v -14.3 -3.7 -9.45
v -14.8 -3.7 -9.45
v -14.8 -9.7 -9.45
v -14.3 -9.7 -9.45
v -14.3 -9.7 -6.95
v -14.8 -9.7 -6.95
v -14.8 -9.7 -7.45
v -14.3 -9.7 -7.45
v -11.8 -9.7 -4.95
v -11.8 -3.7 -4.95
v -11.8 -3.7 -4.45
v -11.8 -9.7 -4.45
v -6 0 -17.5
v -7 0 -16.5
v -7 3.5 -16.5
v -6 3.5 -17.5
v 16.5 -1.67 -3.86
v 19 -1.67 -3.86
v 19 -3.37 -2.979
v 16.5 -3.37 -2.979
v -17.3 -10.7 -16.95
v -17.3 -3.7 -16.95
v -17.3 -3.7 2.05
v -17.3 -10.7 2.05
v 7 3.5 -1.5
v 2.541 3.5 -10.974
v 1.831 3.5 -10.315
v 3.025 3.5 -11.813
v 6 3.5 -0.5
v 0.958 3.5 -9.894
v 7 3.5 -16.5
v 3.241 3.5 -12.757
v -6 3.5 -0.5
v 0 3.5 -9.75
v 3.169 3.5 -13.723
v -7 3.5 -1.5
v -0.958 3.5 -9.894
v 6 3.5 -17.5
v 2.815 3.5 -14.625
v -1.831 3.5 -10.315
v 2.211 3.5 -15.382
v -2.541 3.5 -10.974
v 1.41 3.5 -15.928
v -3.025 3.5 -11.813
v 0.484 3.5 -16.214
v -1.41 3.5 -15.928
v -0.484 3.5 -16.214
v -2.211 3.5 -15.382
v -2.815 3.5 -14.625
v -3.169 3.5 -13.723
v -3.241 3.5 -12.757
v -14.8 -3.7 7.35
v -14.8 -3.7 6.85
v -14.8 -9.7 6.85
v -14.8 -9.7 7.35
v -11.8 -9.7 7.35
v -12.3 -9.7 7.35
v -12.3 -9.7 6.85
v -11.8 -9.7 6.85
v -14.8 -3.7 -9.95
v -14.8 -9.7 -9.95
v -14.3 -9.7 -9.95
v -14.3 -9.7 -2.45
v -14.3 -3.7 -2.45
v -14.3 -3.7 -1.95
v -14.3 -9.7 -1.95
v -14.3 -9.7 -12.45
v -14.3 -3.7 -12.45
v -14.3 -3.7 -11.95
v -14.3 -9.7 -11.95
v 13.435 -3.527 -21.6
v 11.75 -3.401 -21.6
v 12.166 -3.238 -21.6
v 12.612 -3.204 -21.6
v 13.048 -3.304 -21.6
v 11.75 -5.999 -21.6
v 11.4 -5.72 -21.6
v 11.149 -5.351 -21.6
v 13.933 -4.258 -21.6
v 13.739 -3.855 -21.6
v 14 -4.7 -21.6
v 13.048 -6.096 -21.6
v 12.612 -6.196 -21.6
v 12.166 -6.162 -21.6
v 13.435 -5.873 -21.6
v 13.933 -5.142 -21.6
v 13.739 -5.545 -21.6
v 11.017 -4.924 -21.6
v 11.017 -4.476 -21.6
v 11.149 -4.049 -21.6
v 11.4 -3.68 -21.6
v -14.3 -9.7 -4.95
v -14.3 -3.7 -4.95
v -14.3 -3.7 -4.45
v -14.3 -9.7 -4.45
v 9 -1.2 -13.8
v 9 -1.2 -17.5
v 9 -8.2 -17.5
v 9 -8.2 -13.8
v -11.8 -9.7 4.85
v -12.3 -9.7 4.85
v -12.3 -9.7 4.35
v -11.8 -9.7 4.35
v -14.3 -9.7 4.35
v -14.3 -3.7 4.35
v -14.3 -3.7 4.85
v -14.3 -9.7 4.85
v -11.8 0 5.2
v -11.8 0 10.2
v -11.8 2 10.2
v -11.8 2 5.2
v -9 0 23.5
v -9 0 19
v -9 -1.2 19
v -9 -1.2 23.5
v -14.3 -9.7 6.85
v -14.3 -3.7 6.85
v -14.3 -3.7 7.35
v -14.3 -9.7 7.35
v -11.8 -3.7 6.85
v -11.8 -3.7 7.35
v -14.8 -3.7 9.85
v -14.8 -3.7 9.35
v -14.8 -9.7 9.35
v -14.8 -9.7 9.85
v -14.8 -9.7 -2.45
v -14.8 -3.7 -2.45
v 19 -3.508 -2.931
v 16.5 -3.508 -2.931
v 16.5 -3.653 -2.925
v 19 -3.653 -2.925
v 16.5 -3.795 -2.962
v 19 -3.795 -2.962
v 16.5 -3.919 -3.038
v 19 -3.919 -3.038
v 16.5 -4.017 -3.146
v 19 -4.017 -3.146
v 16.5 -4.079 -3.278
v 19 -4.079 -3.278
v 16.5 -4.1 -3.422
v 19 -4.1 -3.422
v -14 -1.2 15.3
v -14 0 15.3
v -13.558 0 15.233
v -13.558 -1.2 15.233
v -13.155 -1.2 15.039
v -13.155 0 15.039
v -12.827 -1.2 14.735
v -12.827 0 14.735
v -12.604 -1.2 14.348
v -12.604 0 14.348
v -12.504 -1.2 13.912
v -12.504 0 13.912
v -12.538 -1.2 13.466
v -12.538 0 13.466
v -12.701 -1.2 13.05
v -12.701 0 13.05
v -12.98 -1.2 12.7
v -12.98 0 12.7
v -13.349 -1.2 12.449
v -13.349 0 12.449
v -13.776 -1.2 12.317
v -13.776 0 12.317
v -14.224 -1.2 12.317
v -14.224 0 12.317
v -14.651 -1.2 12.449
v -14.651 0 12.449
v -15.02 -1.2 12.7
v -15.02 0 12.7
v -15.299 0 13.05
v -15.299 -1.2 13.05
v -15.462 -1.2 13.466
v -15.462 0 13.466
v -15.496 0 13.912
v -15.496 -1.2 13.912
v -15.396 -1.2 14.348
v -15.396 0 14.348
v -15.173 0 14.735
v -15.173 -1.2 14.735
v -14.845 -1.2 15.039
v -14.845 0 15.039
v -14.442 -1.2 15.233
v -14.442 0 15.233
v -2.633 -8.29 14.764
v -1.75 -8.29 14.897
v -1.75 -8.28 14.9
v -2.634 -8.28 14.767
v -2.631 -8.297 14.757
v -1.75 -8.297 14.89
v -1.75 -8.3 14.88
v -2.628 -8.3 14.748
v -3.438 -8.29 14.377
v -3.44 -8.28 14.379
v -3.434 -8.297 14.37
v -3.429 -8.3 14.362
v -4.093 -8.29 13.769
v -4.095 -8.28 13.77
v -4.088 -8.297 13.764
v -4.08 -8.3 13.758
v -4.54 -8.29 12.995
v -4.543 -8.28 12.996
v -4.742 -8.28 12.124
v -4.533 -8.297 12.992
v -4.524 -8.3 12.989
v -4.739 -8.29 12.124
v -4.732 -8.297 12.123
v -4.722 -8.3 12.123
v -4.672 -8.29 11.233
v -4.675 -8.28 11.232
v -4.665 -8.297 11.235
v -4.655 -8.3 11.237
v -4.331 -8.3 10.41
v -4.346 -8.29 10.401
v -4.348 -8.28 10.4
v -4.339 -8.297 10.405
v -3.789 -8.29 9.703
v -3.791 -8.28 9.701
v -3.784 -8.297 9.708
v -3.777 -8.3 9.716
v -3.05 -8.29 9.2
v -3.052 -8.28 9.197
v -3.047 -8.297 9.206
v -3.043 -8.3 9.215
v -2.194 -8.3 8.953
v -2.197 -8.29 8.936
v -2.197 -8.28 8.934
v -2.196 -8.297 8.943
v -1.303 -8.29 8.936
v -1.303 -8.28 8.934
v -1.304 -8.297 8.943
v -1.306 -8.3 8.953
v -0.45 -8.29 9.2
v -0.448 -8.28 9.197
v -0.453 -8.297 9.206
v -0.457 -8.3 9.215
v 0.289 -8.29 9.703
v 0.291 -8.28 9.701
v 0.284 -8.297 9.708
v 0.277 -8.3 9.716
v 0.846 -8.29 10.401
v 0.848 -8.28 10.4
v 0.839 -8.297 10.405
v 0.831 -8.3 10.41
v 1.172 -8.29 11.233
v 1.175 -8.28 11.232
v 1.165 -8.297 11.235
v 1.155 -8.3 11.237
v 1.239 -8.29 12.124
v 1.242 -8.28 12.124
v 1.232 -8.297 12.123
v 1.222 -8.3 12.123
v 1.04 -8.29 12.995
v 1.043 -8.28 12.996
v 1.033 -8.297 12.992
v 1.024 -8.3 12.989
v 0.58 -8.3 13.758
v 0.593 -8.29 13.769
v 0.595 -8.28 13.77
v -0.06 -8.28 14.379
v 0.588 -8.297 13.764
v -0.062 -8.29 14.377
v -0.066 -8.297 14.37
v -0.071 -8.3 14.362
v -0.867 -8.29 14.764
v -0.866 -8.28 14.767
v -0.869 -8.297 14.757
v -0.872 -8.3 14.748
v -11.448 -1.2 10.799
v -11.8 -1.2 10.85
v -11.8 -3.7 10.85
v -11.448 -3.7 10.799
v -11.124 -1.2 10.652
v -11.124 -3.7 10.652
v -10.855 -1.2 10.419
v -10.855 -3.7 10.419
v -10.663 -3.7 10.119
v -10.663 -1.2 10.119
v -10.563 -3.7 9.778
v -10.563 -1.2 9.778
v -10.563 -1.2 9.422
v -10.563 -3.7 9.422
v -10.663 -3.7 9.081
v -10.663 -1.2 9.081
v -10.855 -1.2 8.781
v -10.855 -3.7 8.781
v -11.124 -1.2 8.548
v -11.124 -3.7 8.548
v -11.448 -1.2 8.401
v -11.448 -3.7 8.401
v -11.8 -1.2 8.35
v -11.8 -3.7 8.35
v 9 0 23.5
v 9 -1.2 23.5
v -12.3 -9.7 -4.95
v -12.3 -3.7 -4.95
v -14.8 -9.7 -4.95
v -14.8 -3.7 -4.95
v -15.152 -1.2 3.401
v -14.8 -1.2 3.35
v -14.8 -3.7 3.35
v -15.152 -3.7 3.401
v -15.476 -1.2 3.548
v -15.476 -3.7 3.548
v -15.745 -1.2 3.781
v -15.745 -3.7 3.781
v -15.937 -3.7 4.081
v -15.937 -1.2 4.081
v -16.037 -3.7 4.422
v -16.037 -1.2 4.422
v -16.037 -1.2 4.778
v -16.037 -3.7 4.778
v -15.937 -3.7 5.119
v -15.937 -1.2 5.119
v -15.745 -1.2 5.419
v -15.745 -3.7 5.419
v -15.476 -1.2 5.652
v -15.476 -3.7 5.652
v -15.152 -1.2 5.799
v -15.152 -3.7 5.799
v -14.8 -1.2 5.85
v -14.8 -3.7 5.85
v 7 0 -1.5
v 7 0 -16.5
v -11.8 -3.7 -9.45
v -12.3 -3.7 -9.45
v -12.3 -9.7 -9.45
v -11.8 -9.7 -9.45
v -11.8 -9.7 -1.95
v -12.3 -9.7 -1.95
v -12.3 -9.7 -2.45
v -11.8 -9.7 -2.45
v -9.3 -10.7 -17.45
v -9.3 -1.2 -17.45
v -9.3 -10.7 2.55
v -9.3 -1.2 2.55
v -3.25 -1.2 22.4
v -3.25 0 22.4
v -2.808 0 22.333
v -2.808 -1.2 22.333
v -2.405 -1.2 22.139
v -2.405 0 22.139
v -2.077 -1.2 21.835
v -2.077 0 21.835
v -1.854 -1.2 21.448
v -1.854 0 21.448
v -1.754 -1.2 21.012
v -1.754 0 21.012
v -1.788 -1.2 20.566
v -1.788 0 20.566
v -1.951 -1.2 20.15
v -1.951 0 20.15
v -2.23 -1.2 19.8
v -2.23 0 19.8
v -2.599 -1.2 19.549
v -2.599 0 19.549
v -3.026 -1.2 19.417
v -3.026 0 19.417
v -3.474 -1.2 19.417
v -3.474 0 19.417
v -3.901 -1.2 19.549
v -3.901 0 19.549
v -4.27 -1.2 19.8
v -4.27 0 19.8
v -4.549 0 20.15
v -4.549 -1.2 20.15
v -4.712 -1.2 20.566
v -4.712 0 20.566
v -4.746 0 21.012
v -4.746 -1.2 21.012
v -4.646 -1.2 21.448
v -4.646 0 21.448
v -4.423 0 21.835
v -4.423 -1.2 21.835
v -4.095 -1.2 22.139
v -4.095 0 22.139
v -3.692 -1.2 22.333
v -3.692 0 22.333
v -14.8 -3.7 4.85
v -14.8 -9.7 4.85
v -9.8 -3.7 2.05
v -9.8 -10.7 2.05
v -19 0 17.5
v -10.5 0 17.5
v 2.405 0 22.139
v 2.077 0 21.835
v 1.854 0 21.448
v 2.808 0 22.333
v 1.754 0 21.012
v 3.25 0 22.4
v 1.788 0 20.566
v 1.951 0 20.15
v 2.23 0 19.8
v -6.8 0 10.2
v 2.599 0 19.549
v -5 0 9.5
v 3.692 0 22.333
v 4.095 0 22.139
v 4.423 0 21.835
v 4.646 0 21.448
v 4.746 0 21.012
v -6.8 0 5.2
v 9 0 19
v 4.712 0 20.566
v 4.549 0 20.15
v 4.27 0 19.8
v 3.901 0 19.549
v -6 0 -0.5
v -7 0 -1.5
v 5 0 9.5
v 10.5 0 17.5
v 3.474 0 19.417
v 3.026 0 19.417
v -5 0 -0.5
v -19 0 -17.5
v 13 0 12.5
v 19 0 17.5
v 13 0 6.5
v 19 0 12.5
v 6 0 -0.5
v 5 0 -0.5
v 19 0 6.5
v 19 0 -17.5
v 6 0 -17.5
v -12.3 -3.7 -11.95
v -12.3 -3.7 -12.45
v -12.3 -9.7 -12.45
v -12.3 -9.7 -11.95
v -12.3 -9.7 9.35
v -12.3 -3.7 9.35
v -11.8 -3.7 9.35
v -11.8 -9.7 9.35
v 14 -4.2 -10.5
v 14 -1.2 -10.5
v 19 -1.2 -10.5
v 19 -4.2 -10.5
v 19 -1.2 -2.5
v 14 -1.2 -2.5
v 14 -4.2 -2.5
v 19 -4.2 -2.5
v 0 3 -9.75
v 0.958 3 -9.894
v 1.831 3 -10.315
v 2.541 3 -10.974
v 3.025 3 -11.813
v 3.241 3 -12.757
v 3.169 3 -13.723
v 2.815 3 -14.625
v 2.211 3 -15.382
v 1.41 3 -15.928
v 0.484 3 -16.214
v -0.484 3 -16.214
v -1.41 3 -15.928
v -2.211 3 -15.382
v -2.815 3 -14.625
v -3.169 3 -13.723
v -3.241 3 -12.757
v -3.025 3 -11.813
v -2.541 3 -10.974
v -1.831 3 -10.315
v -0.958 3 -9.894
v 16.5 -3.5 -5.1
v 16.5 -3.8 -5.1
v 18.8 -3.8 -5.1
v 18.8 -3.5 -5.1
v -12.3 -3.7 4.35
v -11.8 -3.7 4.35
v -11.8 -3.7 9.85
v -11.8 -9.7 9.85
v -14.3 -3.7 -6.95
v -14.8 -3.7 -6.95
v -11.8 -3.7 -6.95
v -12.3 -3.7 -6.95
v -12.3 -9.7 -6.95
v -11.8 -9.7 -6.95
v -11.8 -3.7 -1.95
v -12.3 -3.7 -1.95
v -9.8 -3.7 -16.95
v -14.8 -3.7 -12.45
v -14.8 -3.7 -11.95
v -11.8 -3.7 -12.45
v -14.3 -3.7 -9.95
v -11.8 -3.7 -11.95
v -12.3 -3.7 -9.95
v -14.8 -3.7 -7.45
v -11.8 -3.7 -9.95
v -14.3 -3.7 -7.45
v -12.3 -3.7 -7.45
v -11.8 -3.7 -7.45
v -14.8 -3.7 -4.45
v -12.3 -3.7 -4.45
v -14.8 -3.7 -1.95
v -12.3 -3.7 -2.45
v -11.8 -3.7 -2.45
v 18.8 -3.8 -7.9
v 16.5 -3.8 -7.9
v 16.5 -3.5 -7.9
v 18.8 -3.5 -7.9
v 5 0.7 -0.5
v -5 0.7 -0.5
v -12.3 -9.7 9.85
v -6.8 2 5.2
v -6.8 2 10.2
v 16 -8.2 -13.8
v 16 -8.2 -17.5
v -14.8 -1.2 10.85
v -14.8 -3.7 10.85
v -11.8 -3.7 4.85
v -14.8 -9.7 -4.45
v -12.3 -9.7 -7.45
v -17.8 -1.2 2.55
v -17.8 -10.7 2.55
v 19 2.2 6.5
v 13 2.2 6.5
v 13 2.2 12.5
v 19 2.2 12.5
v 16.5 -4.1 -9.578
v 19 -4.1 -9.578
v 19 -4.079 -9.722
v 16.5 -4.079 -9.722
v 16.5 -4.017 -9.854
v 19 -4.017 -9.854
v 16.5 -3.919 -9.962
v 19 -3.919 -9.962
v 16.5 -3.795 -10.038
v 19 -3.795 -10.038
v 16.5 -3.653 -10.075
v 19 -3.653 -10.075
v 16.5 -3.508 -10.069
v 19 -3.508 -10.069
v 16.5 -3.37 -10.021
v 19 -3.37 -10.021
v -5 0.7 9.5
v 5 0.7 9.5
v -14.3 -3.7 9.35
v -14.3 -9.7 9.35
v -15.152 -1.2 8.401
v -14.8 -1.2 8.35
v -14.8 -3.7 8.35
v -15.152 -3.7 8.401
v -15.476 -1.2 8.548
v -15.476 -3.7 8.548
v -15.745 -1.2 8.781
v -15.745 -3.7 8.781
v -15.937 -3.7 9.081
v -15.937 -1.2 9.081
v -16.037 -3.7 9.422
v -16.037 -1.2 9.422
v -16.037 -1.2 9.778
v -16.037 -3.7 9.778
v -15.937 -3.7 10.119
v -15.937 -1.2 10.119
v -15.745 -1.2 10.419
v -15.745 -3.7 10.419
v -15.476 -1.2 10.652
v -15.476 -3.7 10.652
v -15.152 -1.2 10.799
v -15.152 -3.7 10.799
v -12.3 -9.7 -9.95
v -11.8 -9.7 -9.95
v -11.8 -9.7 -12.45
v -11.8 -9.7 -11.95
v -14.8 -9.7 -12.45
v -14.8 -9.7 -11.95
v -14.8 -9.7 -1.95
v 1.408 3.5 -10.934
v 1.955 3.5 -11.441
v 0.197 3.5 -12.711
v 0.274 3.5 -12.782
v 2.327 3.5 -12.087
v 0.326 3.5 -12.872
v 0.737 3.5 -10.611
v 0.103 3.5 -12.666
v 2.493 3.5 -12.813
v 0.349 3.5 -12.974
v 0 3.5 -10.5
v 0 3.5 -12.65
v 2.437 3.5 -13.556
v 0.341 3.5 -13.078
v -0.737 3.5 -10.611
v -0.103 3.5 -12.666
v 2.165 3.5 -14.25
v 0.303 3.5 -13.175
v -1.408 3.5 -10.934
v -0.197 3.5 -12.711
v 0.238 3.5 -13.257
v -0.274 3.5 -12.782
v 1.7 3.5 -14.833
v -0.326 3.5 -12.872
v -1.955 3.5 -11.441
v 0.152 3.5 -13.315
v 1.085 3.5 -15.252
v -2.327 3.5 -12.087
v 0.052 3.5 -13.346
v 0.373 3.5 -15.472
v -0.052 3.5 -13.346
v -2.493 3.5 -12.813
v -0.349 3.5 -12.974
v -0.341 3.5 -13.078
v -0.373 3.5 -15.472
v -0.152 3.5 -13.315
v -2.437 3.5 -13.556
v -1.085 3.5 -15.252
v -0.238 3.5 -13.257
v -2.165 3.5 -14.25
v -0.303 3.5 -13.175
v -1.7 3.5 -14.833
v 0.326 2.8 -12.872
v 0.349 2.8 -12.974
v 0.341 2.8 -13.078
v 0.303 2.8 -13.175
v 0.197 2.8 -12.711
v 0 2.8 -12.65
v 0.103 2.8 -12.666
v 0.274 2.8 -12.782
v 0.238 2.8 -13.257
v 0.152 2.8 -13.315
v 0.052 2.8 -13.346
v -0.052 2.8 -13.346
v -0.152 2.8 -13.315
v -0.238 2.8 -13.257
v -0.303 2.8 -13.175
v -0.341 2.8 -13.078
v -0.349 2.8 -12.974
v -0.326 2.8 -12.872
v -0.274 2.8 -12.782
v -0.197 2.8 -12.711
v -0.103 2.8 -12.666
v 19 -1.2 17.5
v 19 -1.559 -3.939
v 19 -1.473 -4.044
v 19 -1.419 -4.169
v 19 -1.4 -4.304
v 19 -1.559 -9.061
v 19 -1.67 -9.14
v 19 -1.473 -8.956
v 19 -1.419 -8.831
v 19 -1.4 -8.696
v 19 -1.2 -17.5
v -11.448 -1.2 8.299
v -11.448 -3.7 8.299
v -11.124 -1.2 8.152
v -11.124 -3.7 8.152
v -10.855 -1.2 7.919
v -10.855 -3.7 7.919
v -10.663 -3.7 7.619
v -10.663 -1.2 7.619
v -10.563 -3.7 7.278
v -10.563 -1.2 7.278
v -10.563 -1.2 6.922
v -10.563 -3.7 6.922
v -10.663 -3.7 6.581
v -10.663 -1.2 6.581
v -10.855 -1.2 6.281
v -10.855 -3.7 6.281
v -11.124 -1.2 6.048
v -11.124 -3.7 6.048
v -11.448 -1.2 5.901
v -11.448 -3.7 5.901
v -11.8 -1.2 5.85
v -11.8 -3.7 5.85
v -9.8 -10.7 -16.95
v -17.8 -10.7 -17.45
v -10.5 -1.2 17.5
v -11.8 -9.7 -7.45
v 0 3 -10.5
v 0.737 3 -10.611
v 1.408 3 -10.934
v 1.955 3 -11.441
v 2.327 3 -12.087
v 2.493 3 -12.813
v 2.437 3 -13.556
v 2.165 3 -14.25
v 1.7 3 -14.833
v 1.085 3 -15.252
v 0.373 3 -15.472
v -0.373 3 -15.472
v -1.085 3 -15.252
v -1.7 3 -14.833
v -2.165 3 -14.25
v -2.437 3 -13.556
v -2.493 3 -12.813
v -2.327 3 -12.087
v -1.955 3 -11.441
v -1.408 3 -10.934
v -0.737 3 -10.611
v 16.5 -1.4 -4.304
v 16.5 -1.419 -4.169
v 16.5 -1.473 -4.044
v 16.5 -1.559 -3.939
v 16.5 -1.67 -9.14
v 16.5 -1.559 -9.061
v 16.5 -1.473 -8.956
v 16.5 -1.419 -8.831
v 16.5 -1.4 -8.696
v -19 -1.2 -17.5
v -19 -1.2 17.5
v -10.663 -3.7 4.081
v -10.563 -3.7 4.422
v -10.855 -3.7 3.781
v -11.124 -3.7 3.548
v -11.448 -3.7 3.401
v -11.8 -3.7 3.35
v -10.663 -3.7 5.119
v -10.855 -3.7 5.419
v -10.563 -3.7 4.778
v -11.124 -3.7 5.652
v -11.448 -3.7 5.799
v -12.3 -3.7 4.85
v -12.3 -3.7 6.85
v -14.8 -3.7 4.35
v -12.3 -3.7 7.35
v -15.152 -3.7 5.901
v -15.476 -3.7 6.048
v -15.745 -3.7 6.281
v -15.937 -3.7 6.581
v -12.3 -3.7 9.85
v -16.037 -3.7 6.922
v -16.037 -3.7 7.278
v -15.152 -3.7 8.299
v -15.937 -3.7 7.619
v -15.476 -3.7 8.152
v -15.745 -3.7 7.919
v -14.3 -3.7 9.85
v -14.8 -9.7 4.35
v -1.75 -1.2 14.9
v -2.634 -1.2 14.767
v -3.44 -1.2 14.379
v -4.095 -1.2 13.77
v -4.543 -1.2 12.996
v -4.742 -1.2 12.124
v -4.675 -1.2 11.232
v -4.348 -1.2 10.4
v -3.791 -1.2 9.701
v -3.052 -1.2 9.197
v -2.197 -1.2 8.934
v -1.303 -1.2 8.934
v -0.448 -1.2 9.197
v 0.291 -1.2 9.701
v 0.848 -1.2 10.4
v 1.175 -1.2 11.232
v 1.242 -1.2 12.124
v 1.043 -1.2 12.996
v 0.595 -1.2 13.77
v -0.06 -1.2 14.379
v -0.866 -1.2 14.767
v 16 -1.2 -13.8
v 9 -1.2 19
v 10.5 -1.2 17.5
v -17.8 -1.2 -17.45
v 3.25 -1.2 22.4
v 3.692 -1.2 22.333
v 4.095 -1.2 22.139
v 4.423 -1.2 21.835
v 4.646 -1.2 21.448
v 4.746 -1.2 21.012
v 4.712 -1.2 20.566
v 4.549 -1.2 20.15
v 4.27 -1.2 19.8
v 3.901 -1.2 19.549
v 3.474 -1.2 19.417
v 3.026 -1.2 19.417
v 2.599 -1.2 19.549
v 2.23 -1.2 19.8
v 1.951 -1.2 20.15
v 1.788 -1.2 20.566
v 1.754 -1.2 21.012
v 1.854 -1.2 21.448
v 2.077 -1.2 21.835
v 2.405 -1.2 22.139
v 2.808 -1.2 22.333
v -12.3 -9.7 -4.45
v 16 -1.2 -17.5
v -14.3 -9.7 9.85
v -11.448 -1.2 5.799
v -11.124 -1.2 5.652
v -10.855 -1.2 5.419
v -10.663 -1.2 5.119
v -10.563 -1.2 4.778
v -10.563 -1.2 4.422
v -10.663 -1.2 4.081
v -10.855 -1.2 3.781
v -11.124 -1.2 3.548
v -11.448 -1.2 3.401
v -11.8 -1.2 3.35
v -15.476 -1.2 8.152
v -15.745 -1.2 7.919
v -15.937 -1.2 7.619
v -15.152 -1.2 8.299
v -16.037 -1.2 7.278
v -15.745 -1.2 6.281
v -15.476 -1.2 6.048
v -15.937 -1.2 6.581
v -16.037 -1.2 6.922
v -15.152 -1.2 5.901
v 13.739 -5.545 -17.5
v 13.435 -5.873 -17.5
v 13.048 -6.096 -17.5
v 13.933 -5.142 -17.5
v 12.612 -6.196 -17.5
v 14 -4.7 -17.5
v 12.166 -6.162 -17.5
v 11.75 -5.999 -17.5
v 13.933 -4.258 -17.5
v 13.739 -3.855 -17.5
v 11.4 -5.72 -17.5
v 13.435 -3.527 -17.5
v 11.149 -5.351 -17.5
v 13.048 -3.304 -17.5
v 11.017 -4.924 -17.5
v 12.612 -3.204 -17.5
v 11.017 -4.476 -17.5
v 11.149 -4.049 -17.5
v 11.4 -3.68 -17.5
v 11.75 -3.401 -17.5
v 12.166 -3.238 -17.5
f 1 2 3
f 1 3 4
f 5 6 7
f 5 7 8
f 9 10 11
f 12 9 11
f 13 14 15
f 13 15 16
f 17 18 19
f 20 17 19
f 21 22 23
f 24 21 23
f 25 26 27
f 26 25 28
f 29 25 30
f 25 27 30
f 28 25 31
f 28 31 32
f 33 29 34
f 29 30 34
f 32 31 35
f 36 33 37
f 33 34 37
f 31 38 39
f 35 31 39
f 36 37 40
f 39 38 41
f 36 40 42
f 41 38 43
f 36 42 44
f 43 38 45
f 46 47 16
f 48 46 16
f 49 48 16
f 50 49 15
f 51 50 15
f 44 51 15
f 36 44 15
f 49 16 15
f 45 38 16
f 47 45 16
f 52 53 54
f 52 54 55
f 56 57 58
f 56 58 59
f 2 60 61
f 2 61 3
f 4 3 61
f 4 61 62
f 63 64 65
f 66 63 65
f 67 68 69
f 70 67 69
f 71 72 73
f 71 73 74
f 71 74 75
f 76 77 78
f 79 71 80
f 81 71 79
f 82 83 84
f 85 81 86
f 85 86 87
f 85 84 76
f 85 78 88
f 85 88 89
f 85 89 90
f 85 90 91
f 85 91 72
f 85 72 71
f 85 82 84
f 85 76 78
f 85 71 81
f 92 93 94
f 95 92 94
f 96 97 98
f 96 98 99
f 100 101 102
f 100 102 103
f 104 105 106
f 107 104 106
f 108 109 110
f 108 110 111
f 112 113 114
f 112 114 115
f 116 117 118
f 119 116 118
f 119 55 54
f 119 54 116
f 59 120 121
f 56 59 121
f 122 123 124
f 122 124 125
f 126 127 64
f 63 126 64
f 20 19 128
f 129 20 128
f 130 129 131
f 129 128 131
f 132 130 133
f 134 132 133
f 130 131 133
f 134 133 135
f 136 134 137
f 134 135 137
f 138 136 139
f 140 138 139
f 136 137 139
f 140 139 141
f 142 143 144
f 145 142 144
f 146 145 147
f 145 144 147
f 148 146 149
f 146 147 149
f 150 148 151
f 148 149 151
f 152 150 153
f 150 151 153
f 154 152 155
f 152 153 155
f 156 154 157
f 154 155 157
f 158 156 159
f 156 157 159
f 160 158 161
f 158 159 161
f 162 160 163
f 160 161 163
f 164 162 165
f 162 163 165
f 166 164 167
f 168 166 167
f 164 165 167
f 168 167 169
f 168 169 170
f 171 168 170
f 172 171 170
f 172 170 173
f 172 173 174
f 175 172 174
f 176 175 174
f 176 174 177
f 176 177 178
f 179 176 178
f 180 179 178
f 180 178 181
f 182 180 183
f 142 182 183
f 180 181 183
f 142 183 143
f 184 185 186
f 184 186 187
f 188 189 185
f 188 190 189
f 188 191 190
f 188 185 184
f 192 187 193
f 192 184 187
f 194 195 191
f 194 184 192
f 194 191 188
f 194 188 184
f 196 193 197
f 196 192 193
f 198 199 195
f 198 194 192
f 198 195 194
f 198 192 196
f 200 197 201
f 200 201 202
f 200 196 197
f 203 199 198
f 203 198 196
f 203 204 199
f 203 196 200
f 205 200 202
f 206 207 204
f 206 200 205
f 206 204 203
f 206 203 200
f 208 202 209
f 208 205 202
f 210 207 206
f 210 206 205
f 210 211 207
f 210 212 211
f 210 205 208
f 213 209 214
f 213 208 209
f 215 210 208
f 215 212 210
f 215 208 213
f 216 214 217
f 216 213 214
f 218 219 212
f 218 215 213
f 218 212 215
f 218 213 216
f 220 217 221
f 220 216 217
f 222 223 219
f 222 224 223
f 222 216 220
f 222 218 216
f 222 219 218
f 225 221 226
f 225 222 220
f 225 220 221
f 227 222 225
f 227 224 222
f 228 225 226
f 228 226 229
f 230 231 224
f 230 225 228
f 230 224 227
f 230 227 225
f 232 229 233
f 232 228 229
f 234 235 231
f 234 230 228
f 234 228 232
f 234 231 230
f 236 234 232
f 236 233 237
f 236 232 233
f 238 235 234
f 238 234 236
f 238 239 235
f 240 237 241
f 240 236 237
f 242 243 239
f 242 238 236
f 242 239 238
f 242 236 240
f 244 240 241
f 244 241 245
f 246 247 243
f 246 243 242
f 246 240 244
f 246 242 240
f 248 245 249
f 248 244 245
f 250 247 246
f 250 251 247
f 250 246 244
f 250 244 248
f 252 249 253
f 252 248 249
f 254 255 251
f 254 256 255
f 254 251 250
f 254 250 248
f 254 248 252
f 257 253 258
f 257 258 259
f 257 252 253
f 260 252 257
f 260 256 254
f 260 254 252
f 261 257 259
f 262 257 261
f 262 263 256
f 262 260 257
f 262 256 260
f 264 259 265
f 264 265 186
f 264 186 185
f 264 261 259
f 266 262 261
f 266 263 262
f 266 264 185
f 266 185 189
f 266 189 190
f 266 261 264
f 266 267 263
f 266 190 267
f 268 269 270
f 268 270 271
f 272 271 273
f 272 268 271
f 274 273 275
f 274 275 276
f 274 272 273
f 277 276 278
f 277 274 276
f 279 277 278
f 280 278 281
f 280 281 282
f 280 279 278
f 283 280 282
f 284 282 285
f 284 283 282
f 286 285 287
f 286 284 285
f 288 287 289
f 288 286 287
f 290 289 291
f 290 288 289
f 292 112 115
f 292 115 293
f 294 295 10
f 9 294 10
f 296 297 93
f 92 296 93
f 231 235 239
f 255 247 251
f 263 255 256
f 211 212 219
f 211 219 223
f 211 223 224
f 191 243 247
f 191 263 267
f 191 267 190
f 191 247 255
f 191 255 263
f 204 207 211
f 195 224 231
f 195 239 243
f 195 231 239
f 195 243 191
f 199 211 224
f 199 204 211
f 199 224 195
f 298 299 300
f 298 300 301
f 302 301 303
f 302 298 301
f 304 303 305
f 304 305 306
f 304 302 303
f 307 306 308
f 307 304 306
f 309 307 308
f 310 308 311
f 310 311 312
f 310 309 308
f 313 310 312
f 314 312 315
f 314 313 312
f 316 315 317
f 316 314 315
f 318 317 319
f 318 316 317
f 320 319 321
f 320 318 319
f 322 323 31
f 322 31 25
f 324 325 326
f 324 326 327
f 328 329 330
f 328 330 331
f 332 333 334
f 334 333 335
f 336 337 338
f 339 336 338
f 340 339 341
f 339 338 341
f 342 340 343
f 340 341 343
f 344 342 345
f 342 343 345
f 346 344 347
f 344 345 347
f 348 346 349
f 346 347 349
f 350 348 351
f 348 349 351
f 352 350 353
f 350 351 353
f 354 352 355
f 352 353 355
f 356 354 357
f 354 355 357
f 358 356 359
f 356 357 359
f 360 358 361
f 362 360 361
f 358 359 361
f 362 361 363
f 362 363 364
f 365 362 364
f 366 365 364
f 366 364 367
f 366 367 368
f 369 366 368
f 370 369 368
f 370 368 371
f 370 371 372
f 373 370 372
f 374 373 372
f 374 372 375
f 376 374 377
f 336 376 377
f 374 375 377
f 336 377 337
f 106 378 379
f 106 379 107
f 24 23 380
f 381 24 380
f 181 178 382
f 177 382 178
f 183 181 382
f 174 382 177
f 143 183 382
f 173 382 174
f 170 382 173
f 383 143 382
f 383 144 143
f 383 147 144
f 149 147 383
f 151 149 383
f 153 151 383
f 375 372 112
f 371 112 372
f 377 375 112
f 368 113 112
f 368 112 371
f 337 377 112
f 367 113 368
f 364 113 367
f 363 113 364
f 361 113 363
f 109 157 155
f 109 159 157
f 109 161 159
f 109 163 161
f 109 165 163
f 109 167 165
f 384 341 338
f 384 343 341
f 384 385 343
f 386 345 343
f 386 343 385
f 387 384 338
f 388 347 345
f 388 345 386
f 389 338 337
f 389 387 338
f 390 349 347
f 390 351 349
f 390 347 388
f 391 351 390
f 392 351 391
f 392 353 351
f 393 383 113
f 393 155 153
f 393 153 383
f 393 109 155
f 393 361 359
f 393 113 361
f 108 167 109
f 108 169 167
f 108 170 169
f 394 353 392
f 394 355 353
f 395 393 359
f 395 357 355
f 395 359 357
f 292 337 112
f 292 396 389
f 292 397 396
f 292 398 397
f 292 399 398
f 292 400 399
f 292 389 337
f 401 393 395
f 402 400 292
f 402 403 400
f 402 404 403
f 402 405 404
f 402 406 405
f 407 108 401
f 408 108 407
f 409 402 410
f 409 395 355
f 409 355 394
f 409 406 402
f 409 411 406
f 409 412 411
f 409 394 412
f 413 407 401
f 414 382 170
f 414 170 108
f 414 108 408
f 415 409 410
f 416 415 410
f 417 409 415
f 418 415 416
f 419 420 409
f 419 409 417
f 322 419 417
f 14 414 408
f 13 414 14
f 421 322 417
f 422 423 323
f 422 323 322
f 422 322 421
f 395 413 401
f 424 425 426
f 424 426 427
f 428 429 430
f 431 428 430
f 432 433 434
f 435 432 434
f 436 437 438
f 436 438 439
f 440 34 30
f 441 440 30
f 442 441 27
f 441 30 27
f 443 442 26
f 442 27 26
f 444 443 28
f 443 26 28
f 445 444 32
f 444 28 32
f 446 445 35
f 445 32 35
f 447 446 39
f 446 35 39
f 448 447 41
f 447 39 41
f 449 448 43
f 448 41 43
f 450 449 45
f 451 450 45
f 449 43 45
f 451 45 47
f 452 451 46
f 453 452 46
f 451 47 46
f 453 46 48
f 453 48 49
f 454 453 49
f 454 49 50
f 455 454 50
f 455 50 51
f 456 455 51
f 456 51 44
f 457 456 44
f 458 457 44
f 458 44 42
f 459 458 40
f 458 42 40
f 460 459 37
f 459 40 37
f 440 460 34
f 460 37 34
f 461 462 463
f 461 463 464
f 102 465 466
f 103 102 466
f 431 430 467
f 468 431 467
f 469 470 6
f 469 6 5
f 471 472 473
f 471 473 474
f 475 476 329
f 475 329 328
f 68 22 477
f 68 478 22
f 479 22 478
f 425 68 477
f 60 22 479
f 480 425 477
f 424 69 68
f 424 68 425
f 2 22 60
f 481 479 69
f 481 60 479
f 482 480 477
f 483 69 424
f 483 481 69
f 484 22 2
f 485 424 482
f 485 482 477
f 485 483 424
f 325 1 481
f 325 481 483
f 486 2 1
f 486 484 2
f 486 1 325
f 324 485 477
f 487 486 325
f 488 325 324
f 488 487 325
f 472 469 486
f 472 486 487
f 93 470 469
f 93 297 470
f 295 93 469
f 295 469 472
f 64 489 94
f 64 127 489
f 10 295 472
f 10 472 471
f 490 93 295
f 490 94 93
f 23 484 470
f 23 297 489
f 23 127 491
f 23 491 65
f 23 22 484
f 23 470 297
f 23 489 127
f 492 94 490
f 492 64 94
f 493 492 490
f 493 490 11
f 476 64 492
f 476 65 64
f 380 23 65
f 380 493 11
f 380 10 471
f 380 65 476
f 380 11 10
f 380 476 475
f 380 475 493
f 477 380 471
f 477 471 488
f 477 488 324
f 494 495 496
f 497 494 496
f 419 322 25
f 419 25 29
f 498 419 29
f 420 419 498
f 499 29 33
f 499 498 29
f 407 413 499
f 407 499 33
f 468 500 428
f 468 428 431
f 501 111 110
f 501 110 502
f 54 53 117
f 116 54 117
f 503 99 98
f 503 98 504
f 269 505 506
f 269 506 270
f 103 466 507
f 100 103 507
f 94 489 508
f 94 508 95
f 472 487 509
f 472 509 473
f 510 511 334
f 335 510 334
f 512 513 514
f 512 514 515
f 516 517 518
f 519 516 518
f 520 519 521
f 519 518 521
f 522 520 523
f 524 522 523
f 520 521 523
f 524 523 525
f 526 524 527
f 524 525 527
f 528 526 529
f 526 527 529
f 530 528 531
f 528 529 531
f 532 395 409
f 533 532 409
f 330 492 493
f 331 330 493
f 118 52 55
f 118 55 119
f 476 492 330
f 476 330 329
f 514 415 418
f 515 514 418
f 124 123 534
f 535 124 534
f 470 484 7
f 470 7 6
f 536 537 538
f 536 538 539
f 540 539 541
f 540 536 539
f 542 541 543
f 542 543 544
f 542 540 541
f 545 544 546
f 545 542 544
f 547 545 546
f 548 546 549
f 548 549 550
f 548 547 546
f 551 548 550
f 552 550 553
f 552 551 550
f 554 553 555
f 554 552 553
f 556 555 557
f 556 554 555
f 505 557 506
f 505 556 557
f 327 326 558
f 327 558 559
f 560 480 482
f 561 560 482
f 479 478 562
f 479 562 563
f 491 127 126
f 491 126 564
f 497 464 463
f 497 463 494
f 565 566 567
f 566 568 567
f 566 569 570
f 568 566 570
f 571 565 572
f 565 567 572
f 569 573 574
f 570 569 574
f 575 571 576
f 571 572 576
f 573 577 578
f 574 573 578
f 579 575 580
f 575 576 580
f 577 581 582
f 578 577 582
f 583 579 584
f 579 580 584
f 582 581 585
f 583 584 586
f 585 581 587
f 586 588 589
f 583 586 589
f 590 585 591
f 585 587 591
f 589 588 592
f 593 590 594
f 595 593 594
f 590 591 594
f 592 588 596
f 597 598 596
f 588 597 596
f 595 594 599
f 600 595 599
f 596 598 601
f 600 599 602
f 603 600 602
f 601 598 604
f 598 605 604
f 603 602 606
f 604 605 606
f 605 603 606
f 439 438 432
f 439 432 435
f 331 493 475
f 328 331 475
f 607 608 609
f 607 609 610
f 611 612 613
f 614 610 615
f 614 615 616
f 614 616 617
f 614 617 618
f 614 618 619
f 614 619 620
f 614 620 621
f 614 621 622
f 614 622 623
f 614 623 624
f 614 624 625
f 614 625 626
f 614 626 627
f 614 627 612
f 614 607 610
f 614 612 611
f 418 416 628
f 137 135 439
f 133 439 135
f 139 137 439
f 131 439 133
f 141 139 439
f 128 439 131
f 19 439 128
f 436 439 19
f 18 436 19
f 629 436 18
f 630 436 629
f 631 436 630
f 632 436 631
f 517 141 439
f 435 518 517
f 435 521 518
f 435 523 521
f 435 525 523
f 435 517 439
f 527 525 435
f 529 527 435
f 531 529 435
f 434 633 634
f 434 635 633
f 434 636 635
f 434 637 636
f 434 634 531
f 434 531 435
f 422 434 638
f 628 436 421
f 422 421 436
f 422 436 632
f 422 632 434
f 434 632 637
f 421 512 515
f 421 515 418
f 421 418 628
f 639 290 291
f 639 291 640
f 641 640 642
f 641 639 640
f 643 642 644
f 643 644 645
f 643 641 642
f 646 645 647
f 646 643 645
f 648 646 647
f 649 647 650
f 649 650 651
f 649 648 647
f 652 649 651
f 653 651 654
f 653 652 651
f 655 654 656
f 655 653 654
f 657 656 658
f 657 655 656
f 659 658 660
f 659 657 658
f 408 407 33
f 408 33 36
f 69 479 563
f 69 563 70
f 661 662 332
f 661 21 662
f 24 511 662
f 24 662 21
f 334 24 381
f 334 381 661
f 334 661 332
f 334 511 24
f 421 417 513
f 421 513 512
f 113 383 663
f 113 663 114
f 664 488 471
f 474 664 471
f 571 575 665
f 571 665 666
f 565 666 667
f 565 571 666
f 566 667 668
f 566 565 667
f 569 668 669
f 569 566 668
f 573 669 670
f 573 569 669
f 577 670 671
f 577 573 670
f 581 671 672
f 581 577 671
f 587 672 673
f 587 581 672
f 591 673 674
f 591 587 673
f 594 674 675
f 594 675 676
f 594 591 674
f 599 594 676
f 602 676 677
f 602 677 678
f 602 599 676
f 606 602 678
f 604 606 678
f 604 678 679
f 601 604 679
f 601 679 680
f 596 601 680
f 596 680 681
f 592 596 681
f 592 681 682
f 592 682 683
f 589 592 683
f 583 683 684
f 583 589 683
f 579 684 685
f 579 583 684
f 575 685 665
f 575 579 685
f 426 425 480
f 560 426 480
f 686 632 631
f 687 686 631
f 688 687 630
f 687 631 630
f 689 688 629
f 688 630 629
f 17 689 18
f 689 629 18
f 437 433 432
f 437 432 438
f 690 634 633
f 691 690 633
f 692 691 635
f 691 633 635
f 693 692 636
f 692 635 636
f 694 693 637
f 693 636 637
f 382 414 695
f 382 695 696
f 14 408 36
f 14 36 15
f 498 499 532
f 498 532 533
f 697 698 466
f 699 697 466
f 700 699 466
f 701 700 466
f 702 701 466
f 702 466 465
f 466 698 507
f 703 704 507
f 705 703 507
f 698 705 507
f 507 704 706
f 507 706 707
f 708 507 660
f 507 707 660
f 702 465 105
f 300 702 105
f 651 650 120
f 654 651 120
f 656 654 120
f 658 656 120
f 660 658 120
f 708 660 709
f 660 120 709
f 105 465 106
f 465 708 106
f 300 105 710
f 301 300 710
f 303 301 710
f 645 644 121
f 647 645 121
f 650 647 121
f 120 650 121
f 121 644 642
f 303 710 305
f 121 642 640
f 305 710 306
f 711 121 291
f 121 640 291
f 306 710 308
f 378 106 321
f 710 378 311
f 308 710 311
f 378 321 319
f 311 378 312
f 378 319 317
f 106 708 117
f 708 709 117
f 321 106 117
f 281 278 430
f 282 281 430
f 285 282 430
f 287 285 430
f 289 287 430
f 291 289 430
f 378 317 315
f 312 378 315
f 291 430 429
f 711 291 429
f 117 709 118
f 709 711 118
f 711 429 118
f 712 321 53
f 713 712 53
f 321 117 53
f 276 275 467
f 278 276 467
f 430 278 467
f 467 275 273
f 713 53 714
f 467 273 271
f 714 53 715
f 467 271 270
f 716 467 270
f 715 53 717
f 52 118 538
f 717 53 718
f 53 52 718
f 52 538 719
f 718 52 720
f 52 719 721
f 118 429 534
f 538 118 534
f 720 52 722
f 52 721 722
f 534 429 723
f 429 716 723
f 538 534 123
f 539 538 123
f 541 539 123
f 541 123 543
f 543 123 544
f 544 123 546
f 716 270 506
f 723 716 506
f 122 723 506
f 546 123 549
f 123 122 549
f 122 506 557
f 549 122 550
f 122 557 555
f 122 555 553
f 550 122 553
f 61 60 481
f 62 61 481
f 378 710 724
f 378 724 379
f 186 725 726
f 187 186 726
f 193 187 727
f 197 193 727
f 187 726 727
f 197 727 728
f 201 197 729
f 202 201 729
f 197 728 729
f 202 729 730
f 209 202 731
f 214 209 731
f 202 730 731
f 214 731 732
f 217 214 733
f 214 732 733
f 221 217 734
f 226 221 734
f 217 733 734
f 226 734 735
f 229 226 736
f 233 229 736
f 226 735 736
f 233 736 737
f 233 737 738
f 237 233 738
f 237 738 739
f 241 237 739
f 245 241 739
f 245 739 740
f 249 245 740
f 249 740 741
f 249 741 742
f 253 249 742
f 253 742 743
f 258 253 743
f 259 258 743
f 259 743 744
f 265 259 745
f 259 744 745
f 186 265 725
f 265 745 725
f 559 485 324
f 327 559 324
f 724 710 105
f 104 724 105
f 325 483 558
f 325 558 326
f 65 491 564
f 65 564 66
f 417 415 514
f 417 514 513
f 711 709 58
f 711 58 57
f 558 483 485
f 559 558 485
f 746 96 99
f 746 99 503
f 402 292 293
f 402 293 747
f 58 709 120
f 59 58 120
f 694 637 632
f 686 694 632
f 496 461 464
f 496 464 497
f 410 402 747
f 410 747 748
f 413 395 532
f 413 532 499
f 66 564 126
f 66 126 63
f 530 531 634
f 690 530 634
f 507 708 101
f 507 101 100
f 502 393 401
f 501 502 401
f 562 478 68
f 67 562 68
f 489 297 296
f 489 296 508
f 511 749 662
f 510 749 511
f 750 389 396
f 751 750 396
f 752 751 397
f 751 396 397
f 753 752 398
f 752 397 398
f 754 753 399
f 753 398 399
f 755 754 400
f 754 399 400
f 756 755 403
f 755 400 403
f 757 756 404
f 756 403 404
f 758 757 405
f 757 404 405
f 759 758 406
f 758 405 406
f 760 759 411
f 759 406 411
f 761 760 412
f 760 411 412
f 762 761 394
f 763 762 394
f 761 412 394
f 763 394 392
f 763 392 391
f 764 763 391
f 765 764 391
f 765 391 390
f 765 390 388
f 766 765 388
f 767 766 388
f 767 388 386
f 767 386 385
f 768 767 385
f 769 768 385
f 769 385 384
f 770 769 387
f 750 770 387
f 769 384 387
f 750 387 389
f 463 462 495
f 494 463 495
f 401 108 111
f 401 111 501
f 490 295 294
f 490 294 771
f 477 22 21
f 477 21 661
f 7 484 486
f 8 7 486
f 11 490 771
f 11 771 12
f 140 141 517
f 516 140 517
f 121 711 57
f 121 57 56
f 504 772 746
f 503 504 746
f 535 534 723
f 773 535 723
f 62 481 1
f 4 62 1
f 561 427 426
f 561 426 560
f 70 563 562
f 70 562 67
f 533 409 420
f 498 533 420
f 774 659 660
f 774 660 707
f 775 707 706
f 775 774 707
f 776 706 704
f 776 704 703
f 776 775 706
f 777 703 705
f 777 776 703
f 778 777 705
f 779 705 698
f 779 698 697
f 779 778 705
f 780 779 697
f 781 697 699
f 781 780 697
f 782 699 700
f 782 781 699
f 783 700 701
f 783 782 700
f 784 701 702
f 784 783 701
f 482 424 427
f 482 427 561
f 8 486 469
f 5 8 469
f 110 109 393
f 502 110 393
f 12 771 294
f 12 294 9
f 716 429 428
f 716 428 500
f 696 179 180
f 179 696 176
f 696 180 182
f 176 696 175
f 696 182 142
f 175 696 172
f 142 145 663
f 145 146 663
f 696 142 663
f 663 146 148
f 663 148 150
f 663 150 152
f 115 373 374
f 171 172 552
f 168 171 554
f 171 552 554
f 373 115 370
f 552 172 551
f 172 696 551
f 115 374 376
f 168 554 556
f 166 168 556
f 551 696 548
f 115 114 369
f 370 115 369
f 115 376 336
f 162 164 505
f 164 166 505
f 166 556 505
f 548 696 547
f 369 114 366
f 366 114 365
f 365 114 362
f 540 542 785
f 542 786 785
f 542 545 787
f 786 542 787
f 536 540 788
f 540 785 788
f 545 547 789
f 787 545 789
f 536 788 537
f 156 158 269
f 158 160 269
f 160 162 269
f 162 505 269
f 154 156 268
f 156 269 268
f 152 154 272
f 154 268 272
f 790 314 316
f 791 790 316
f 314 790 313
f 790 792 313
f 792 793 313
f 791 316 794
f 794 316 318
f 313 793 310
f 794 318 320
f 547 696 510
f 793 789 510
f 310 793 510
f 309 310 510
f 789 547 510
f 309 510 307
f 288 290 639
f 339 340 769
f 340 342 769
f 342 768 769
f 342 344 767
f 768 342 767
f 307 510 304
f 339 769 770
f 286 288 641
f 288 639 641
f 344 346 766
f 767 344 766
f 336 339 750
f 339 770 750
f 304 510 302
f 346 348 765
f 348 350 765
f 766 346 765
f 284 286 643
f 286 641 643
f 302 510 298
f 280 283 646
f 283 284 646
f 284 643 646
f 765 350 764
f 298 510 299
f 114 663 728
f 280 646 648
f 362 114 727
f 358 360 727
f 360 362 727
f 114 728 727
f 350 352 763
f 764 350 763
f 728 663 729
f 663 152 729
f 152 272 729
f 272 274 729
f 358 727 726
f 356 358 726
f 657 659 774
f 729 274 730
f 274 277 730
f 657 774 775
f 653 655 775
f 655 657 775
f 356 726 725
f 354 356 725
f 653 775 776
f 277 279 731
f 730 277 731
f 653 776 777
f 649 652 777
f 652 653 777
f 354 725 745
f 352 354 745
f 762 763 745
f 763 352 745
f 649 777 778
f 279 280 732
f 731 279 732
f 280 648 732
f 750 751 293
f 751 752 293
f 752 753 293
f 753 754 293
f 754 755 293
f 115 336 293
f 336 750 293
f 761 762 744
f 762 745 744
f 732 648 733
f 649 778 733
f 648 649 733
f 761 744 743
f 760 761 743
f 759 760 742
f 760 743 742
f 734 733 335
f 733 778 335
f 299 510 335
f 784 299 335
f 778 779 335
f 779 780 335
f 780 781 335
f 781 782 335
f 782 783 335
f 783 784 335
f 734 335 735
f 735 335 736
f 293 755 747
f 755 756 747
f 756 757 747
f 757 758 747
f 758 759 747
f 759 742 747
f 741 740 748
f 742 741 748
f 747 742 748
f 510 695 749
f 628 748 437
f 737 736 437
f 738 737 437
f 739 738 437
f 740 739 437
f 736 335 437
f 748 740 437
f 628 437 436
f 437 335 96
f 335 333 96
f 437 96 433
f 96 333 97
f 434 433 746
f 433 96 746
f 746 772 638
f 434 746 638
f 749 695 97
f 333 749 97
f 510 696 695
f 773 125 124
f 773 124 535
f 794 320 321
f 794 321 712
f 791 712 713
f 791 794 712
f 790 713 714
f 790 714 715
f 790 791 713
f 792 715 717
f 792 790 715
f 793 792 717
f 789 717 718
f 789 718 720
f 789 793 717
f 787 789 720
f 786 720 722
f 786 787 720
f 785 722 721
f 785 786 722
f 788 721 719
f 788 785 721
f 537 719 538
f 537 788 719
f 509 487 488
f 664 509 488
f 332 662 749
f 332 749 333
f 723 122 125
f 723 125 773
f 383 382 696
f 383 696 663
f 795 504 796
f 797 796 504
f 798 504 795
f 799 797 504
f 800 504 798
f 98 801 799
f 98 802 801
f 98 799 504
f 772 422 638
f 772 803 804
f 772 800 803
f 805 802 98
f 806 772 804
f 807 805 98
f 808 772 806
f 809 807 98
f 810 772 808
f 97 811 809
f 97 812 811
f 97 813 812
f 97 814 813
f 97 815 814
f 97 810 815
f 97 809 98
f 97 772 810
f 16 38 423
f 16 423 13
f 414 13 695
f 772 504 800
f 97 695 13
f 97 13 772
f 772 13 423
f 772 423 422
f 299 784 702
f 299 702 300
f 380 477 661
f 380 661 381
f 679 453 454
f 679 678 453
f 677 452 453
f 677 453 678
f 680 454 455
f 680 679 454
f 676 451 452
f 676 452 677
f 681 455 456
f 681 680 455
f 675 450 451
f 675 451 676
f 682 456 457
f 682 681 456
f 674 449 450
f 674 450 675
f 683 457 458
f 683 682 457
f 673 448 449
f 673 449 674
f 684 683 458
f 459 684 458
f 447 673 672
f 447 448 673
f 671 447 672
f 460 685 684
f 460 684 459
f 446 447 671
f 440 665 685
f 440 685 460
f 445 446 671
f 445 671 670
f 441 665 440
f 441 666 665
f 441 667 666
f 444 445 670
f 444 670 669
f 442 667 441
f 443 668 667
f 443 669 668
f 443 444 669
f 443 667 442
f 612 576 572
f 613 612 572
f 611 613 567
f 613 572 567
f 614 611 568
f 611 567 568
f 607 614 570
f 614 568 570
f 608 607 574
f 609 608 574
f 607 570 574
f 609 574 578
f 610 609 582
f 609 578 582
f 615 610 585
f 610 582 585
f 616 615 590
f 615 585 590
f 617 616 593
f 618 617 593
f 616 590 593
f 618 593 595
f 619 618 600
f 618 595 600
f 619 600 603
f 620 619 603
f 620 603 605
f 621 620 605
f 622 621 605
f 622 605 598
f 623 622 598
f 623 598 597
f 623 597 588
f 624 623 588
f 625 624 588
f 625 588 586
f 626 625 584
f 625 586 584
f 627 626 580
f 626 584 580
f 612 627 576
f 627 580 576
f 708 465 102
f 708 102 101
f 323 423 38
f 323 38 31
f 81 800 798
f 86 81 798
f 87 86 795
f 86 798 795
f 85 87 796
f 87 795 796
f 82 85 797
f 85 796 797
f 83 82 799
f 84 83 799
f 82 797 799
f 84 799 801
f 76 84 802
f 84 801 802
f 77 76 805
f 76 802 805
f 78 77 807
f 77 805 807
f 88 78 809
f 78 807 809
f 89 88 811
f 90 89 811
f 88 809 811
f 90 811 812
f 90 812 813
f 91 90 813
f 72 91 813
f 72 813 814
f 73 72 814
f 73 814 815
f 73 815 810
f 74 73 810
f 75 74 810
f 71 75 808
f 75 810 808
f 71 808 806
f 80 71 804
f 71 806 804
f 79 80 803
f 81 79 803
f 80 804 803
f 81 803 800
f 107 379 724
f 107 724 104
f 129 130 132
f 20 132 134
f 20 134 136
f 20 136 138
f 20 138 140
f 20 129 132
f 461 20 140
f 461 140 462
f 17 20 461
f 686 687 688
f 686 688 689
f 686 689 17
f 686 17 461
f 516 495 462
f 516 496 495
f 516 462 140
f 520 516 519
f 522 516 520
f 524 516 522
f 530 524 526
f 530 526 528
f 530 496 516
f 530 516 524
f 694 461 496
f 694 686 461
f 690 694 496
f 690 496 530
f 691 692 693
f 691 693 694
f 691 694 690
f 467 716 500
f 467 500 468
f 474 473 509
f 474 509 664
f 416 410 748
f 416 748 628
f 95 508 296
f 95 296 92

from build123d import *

# Parameters (mm, degrees)
SKETCH_1_R          = 1.5
EXTRUDE_1_DEPTH     = 1.2
EXTRUDE_2_DEPTH     = 3.5
SKETCH_3_R          = 3.25
SKETCH_3_R_2        = 2.5
CUT_EXTRUDE_1_DEPTH = 0.5
SKETCH_4_R          = 0.35
CUT_EXTRUDE_2_DEPTH = 0.7
SKETCH_5_W          = 6
SKETCH_5_H          = 6
EXTRUDE_3_DEPTH     = 2.2
SKETCH_6_W          = 10
SKETCH_6_H          = 10
EXTRUDE_4_DEPTH     = 0.7
SKETCH_7_W          = 5
SKETCH_7_H          = 5
EXTRUDE_5_DEPTH     = 2
SKETCH_8_W          = 5
SKETCH_8_H          = 8
EXTRUDE_6_DEPTH     = 3
CUT_EXTRUDE_3_DEPTH = 2.5
SKETCH_10_W         = 2.8
SKETCH_10_H         = 0.3
EXTRUDE_7_DEPTH     = 2.3
SKETCH_11_R         = 3
EXTRUDE_8_DEPTH     = 7.1
FILLET_1_R          = 0.02
SKETCH_12_W         = 7
SKETCH_12_H         = 3.7
EXTRUDE_9_DEPTH     = 7
SKETCH_13_R         = 1.5
EXTRUDE_10_DEPTH    = 4.1
SKETCH_14_W         = 8.5
SKETCH_14_H         = 20
SKETCH_14_W_2       = 7.5
SKETCH_14_H_2       = 19
EXTRUDE_11_DEPTH    = 9.5
SKETCH_15_W         = 0.5
SKETCH_15_H         = 0.5
EXTRUDE_12_DEPTH    = 8.5
SKETCH_16_W         = 0.5
SKETCH_16_H         = 0.5
EXTRUDE_13_DEPTH    = 8.5
SKETCH_17_W         = 7.5
SKETCH_17_H         = 19
EXTRUDE_14_DEPTH    = 2.5


with BuildPart() as part:
    # 草图1 → 凸台-拉伸1 (new body)
    with BuildSketch(Plane(origin=(0, 0, 0), x_dir=(1, 0, 0), z_dir=(0, 1, 0))):
        Polygon((9, -19), (10.5, -17.5), (19, -17.5), (19, 17.5), (-19, 17.5), (-19, -17.5), (-10.5, -17.5), (-9, -19), (-9, -23.5), (9, -23.5), align=None)
        with Locations((-14, -13.8)):
            Circle(SKETCH_1_R, mode=Mode.SUBTRACT)
        with Locations((-3.25, -20.9)):
            Circle(SKETCH_1_R, mode=Mode.SUBTRACT)
        with Locations((3.25, -20.9)):
            Circle(SKETCH_1_R, mode=Mode.SUBTRACT)
    extrude(amount=-EXTRUDE_1_DEPTH)

    # 草图2 → 凸台-拉伸2 (add)
    with BuildSketch(Plane(origin=(0, 0, 0), x_dir=(1, 0, 0), z_dir=(0, 1, 0))):
        Polygon((-6, 17.5), (6, 17.5), (7, 16.5), (7, 1.5), (6, 0.5), (-6, 0.5), (-7, 1.5), (-7, 16.5), align=None)
    extrude(amount=EXTRUDE_2_DEPTH)

    # 草图3 → 切除-拉伸1 (cut)
    with BuildSketch(Plane(origin=(0, 3.5, 0), x_dir=(1, 0, 0), z_dir=(0, 1, 0))):
        with Locations((0, 13)):
            Circle(SKETCH_3_R)
        with Locations((0, 13)):
            Circle(SKETCH_3_R_2, mode=Mode.SUBTRACT)
    extrude(amount=-CUT_EXTRUDE_1_DEPTH, mode=Mode.SUBTRACT)

    # 草图4 → 切除-拉伸2 (cut)
    with BuildSketch(Plane(origin=(0, 3.5, 0), x_dir=(1, 0, 0), z_dir=(0, 1, 0))):
        with Locations((0, 13)):
            Circle(SKETCH_4_R)
    extrude(amount=-CUT_EXTRUDE_2_DEPTH, mode=Mode.SUBTRACT)

    # 草图5 → 凸台-拉伸3 (add)
    with BuildSketch(Plane(origin=(0, 0, 0), x_dir=(1, 0, 0), z_dir=(0, 1, 0))):
        with Locations((16, -9.5)):
            Rectangle(SKETCH_5_W, SKETCH_5_H)
    extrude(amount=EXTRUDE_3_DEPTH)

    # 草图6 → 凸台-拉伸4 (add)
    with BuildSketch(Plane(origin=(0, 0, 0), x_dir=(1, 0, 0), z_dir=(0, 1, 0))):
        with Locations((0, -4.5)):
            Rectangle(SKETCH_6_W, SKETCH_6_H)
    extrude(amount=EXTRUDE_4_DEPTH)

    # 草图7 → 凸台-拉伸5 (add)
    with BuildSketch(Plane(origin=(0, 0, 0), x_dir=(1, 0, 0), z_dir=(0, 1, 0))):
        with Locations((-9.3, -7.7)):
            Rectangle(SKETCH_7_W, SKETCH_7_H)
    extrude(amount=EXTRUDE_5_DEPTH)

    # 草图8 → 凸台-拉伸6 (add)
    with BuildSketch(Plane.XZ.offset(1.2)):
        with Locations((16.5, -6.5)):
            Rectangle(SKETCH_8_W, SKETCH_8_H)
    extrude(amount=EXTRUDE_6_DEPTH)

    # 草图9 → 切除-拉伸3 (cut)
    with BuildSketch(Plane(origin=(19, 0, 0), x_dir=(0, 0, -1), z_dir=(1, 0, 0))):
        with BuildLine():
            Line((3.860082228, -1.669841418), (2.978600746, -3.369841418))
            ThreePointArc((2.978600746, -3.369841418), (2.995231426, -3.859731312), (3.422478012, -4.1))
            Line((3.422478012, -4.1), (9.577521988, -4.1))
            ThreePointArc((9.577521988, -4.1), (10.004768574, -3.859731312), (10.021399254, -3.369841418))
            Line((10.021399254, -3.369841418), (9.139917772, -1.669841418))
            ThreePointArc((9.139917772, -1.669841418), (8.955771818, -1.472753414), (8.696040506, -1.4))
            Line((8.696040506, -1.4), (4.303959494, -1.4))
            ThreePointArc((4.303959494, -1.4), (4.044228182, -1.472753414), (3.860082228, -1.669841418))
        make_face()
    extrude(amount=-CUT_EXTRUDE_3_DEPTH, mode=Mode.SUBTRACT)

    # 草图10 → 凸台-拉伸7 (add)
    with BuildSketch(Plane(origin=(16.5, 0, 0), x_dir=(0, 0, -1), z_dir=(1, 0, 0))):
        with Locations((6.5, -3.65)):
            Rectangle(SKETCH_10_W, SKETCH_10_H)
    extrude(amount=EXTRUDE_7_DEPTH)

    # 草图11 → 凸台-拉伸8 (add)
    with BuildSketch(Plane(origin=(0, -1.2, 0), x_dir=(-1, 0, 0), z_dir=(0, -1, 0))):
        with Locations((1.75, -11.9)):
            Circle(SKETCH_11_R)
    extrude(amount=EXTRUDE_8_DEPTH)

    # 圆角1
    fillet_1_edges = [part.edges().sort_by_distance(p)[0] for p in [
        (1.25, -8.3, 11.9),
    ]]
    fillet(fillet_1_edges, radius=FILLET_1_R)

    # 草图12 → 凸台-拉伸9 (add)
    with BuildSketch(Plane.XZ.offset(1.2)):
        with Locations((12.5, -15.65)):
            Rectangle(SKETCH_12_W, SKETCH_12_H)
    extrude(amount=EXTRUDE_9_DEPTH)

    # 草图13 → 凸台-拉伸10 (add)
    with BuildSketch(Plane(origin=(0, 0, -17.5), x_dir=(-1, 0, 0), z_dir=(0, 0, -1))):
        with Locations((-12.5, -4.7)):
            Circle(SKETCH_13_R)
    extrude(amount=EXTRUDE_10_DEPTH)

    # 草图14 → 凸台-拉伸11 (add)
    with BuildSketch(Plane.XZ.offset(1.2)):
        with Locations((-13.55, -7.45)):
            Rectangle(SKETCH_14_W, SKETCH_14_H)
        with Locations((-13.55, -7.45)):
            Rectangle(SKETCH_14_W_2, SKETCH_14_H_2, mode=Mode.SUBTRACT)
    extrude(amount=EXTRUDE_11_DEPTH)

    # 草图15 → 凸台-拉伸12 (add)
    with BuildSketch(Plane.XZ.offset(1.2)):
        with Locations((-14.55, -2.2)):
            Rectangle(SKETCH_15_W, SKETCH_15_H)
        with Locations((-12.05, -2.2)):
            Rectangle(SKETCH_15_W, SKETCH_15_H)
        with Locations((-12.05, -4.7)):
            Rectangle(SKETCH_15_W, SKETCH_15_H)
        with Locations((-12.05, -7.2)):
            Rectangle(SKETCH_15_W, SKETCH_15_H)
        with Locations((-12.05, -9.7)):
            Rectangle(SKETCH_15_W, SKETCH_15_H)
        with Locations((-12.05, -12.2)):
            Rectangle(SKETCH_15_W, SKETCH_15_H)
        with Locations((-14.55, -4.7)):
            Rectangle(SKETCH_15_W, SKETCH_15_H)
        with Locations((-14.55, -7.2)):
            Rectangle(SKETCH_15_W, SKETCH_15_H)
        with Locations((-14.55, -9.7)):
            Rectangle(SKETCH_15_W, SKETCH_15_H)
        with Locations((-14.55, -12.2)):
            Rectangle(SKETCH_15_W, SKETCH_15_H)
    extrude(amount=EXTRUDE_12_DEPTH)

    # 草图16 → 凸台-拉伸13 (add)
    with BuildSketch(Plane.XZ.offset(1.2)):
        with Locations((-14.55, 4.6)):
            Rectangle(SKETCH_16_W, SKETCH_16_H)
        with Locations((-12.05, 4.6)):
            Rectangle(SKETCH_16_W, SKETCH_16_H)
        with Locations((-12.05, 7.1)):
            Rectangle(SKETCH_16_W, SKETCH_16_H)
        with Locations((-12.05, 9.6)):
            Rectangle(SKETCH_16_W, SKETCH_16_H)
        with Locations((-14.55, 7.1)):
            Rectangle(SKETCH_16_W, SKETCH_16_H)
        with Locations((-14.55, 9.6)):
            Rectangle(SKETCH_16_W, SKETCH_16_H)
    extrude(amount=EXTRUDE_13_DEPTH)

    # 草图17 → 凸台-拉伸14 (add)
    with BuildSketch(Plane.XZ.offset(1.2)):
        with Locations((-13.55, -7.45)):
            Rectangle(SKETCH_17_W, SKETCH_17_H)
        with BuildLine():
            Line((-14.8, 10.85), (-11.8, 10.85))
            ThreePointArc((-11.8, 10.85), (-10.55, 9.6), (-11.8, 8.35))
            ThreePointArc((-11.8, 8.35), (-10.55, 7.1), (-11.8, 5.85))
            ThreePointArc((-11.8, 5.85), (-10.55, 4.6), (-11.8, 3.35))
            Line((-11.8, 3.35), (-14.8, 3.35))
            ThreePointArc((-14.8, 3.35), (-16.05, 4.6), (-14.8, 5.85))
            ThreePointArc((-14.8, 5.85), (-16.05, 7.1), (-14.8, 8.35))
            ThreePointArc((-14.8, 8.35), (-16.05, 9.6), (-14.8, 10.85))
        make_face()
    extrude(amount=EXTRUDE_14_DEPTH)


solid = part.part
